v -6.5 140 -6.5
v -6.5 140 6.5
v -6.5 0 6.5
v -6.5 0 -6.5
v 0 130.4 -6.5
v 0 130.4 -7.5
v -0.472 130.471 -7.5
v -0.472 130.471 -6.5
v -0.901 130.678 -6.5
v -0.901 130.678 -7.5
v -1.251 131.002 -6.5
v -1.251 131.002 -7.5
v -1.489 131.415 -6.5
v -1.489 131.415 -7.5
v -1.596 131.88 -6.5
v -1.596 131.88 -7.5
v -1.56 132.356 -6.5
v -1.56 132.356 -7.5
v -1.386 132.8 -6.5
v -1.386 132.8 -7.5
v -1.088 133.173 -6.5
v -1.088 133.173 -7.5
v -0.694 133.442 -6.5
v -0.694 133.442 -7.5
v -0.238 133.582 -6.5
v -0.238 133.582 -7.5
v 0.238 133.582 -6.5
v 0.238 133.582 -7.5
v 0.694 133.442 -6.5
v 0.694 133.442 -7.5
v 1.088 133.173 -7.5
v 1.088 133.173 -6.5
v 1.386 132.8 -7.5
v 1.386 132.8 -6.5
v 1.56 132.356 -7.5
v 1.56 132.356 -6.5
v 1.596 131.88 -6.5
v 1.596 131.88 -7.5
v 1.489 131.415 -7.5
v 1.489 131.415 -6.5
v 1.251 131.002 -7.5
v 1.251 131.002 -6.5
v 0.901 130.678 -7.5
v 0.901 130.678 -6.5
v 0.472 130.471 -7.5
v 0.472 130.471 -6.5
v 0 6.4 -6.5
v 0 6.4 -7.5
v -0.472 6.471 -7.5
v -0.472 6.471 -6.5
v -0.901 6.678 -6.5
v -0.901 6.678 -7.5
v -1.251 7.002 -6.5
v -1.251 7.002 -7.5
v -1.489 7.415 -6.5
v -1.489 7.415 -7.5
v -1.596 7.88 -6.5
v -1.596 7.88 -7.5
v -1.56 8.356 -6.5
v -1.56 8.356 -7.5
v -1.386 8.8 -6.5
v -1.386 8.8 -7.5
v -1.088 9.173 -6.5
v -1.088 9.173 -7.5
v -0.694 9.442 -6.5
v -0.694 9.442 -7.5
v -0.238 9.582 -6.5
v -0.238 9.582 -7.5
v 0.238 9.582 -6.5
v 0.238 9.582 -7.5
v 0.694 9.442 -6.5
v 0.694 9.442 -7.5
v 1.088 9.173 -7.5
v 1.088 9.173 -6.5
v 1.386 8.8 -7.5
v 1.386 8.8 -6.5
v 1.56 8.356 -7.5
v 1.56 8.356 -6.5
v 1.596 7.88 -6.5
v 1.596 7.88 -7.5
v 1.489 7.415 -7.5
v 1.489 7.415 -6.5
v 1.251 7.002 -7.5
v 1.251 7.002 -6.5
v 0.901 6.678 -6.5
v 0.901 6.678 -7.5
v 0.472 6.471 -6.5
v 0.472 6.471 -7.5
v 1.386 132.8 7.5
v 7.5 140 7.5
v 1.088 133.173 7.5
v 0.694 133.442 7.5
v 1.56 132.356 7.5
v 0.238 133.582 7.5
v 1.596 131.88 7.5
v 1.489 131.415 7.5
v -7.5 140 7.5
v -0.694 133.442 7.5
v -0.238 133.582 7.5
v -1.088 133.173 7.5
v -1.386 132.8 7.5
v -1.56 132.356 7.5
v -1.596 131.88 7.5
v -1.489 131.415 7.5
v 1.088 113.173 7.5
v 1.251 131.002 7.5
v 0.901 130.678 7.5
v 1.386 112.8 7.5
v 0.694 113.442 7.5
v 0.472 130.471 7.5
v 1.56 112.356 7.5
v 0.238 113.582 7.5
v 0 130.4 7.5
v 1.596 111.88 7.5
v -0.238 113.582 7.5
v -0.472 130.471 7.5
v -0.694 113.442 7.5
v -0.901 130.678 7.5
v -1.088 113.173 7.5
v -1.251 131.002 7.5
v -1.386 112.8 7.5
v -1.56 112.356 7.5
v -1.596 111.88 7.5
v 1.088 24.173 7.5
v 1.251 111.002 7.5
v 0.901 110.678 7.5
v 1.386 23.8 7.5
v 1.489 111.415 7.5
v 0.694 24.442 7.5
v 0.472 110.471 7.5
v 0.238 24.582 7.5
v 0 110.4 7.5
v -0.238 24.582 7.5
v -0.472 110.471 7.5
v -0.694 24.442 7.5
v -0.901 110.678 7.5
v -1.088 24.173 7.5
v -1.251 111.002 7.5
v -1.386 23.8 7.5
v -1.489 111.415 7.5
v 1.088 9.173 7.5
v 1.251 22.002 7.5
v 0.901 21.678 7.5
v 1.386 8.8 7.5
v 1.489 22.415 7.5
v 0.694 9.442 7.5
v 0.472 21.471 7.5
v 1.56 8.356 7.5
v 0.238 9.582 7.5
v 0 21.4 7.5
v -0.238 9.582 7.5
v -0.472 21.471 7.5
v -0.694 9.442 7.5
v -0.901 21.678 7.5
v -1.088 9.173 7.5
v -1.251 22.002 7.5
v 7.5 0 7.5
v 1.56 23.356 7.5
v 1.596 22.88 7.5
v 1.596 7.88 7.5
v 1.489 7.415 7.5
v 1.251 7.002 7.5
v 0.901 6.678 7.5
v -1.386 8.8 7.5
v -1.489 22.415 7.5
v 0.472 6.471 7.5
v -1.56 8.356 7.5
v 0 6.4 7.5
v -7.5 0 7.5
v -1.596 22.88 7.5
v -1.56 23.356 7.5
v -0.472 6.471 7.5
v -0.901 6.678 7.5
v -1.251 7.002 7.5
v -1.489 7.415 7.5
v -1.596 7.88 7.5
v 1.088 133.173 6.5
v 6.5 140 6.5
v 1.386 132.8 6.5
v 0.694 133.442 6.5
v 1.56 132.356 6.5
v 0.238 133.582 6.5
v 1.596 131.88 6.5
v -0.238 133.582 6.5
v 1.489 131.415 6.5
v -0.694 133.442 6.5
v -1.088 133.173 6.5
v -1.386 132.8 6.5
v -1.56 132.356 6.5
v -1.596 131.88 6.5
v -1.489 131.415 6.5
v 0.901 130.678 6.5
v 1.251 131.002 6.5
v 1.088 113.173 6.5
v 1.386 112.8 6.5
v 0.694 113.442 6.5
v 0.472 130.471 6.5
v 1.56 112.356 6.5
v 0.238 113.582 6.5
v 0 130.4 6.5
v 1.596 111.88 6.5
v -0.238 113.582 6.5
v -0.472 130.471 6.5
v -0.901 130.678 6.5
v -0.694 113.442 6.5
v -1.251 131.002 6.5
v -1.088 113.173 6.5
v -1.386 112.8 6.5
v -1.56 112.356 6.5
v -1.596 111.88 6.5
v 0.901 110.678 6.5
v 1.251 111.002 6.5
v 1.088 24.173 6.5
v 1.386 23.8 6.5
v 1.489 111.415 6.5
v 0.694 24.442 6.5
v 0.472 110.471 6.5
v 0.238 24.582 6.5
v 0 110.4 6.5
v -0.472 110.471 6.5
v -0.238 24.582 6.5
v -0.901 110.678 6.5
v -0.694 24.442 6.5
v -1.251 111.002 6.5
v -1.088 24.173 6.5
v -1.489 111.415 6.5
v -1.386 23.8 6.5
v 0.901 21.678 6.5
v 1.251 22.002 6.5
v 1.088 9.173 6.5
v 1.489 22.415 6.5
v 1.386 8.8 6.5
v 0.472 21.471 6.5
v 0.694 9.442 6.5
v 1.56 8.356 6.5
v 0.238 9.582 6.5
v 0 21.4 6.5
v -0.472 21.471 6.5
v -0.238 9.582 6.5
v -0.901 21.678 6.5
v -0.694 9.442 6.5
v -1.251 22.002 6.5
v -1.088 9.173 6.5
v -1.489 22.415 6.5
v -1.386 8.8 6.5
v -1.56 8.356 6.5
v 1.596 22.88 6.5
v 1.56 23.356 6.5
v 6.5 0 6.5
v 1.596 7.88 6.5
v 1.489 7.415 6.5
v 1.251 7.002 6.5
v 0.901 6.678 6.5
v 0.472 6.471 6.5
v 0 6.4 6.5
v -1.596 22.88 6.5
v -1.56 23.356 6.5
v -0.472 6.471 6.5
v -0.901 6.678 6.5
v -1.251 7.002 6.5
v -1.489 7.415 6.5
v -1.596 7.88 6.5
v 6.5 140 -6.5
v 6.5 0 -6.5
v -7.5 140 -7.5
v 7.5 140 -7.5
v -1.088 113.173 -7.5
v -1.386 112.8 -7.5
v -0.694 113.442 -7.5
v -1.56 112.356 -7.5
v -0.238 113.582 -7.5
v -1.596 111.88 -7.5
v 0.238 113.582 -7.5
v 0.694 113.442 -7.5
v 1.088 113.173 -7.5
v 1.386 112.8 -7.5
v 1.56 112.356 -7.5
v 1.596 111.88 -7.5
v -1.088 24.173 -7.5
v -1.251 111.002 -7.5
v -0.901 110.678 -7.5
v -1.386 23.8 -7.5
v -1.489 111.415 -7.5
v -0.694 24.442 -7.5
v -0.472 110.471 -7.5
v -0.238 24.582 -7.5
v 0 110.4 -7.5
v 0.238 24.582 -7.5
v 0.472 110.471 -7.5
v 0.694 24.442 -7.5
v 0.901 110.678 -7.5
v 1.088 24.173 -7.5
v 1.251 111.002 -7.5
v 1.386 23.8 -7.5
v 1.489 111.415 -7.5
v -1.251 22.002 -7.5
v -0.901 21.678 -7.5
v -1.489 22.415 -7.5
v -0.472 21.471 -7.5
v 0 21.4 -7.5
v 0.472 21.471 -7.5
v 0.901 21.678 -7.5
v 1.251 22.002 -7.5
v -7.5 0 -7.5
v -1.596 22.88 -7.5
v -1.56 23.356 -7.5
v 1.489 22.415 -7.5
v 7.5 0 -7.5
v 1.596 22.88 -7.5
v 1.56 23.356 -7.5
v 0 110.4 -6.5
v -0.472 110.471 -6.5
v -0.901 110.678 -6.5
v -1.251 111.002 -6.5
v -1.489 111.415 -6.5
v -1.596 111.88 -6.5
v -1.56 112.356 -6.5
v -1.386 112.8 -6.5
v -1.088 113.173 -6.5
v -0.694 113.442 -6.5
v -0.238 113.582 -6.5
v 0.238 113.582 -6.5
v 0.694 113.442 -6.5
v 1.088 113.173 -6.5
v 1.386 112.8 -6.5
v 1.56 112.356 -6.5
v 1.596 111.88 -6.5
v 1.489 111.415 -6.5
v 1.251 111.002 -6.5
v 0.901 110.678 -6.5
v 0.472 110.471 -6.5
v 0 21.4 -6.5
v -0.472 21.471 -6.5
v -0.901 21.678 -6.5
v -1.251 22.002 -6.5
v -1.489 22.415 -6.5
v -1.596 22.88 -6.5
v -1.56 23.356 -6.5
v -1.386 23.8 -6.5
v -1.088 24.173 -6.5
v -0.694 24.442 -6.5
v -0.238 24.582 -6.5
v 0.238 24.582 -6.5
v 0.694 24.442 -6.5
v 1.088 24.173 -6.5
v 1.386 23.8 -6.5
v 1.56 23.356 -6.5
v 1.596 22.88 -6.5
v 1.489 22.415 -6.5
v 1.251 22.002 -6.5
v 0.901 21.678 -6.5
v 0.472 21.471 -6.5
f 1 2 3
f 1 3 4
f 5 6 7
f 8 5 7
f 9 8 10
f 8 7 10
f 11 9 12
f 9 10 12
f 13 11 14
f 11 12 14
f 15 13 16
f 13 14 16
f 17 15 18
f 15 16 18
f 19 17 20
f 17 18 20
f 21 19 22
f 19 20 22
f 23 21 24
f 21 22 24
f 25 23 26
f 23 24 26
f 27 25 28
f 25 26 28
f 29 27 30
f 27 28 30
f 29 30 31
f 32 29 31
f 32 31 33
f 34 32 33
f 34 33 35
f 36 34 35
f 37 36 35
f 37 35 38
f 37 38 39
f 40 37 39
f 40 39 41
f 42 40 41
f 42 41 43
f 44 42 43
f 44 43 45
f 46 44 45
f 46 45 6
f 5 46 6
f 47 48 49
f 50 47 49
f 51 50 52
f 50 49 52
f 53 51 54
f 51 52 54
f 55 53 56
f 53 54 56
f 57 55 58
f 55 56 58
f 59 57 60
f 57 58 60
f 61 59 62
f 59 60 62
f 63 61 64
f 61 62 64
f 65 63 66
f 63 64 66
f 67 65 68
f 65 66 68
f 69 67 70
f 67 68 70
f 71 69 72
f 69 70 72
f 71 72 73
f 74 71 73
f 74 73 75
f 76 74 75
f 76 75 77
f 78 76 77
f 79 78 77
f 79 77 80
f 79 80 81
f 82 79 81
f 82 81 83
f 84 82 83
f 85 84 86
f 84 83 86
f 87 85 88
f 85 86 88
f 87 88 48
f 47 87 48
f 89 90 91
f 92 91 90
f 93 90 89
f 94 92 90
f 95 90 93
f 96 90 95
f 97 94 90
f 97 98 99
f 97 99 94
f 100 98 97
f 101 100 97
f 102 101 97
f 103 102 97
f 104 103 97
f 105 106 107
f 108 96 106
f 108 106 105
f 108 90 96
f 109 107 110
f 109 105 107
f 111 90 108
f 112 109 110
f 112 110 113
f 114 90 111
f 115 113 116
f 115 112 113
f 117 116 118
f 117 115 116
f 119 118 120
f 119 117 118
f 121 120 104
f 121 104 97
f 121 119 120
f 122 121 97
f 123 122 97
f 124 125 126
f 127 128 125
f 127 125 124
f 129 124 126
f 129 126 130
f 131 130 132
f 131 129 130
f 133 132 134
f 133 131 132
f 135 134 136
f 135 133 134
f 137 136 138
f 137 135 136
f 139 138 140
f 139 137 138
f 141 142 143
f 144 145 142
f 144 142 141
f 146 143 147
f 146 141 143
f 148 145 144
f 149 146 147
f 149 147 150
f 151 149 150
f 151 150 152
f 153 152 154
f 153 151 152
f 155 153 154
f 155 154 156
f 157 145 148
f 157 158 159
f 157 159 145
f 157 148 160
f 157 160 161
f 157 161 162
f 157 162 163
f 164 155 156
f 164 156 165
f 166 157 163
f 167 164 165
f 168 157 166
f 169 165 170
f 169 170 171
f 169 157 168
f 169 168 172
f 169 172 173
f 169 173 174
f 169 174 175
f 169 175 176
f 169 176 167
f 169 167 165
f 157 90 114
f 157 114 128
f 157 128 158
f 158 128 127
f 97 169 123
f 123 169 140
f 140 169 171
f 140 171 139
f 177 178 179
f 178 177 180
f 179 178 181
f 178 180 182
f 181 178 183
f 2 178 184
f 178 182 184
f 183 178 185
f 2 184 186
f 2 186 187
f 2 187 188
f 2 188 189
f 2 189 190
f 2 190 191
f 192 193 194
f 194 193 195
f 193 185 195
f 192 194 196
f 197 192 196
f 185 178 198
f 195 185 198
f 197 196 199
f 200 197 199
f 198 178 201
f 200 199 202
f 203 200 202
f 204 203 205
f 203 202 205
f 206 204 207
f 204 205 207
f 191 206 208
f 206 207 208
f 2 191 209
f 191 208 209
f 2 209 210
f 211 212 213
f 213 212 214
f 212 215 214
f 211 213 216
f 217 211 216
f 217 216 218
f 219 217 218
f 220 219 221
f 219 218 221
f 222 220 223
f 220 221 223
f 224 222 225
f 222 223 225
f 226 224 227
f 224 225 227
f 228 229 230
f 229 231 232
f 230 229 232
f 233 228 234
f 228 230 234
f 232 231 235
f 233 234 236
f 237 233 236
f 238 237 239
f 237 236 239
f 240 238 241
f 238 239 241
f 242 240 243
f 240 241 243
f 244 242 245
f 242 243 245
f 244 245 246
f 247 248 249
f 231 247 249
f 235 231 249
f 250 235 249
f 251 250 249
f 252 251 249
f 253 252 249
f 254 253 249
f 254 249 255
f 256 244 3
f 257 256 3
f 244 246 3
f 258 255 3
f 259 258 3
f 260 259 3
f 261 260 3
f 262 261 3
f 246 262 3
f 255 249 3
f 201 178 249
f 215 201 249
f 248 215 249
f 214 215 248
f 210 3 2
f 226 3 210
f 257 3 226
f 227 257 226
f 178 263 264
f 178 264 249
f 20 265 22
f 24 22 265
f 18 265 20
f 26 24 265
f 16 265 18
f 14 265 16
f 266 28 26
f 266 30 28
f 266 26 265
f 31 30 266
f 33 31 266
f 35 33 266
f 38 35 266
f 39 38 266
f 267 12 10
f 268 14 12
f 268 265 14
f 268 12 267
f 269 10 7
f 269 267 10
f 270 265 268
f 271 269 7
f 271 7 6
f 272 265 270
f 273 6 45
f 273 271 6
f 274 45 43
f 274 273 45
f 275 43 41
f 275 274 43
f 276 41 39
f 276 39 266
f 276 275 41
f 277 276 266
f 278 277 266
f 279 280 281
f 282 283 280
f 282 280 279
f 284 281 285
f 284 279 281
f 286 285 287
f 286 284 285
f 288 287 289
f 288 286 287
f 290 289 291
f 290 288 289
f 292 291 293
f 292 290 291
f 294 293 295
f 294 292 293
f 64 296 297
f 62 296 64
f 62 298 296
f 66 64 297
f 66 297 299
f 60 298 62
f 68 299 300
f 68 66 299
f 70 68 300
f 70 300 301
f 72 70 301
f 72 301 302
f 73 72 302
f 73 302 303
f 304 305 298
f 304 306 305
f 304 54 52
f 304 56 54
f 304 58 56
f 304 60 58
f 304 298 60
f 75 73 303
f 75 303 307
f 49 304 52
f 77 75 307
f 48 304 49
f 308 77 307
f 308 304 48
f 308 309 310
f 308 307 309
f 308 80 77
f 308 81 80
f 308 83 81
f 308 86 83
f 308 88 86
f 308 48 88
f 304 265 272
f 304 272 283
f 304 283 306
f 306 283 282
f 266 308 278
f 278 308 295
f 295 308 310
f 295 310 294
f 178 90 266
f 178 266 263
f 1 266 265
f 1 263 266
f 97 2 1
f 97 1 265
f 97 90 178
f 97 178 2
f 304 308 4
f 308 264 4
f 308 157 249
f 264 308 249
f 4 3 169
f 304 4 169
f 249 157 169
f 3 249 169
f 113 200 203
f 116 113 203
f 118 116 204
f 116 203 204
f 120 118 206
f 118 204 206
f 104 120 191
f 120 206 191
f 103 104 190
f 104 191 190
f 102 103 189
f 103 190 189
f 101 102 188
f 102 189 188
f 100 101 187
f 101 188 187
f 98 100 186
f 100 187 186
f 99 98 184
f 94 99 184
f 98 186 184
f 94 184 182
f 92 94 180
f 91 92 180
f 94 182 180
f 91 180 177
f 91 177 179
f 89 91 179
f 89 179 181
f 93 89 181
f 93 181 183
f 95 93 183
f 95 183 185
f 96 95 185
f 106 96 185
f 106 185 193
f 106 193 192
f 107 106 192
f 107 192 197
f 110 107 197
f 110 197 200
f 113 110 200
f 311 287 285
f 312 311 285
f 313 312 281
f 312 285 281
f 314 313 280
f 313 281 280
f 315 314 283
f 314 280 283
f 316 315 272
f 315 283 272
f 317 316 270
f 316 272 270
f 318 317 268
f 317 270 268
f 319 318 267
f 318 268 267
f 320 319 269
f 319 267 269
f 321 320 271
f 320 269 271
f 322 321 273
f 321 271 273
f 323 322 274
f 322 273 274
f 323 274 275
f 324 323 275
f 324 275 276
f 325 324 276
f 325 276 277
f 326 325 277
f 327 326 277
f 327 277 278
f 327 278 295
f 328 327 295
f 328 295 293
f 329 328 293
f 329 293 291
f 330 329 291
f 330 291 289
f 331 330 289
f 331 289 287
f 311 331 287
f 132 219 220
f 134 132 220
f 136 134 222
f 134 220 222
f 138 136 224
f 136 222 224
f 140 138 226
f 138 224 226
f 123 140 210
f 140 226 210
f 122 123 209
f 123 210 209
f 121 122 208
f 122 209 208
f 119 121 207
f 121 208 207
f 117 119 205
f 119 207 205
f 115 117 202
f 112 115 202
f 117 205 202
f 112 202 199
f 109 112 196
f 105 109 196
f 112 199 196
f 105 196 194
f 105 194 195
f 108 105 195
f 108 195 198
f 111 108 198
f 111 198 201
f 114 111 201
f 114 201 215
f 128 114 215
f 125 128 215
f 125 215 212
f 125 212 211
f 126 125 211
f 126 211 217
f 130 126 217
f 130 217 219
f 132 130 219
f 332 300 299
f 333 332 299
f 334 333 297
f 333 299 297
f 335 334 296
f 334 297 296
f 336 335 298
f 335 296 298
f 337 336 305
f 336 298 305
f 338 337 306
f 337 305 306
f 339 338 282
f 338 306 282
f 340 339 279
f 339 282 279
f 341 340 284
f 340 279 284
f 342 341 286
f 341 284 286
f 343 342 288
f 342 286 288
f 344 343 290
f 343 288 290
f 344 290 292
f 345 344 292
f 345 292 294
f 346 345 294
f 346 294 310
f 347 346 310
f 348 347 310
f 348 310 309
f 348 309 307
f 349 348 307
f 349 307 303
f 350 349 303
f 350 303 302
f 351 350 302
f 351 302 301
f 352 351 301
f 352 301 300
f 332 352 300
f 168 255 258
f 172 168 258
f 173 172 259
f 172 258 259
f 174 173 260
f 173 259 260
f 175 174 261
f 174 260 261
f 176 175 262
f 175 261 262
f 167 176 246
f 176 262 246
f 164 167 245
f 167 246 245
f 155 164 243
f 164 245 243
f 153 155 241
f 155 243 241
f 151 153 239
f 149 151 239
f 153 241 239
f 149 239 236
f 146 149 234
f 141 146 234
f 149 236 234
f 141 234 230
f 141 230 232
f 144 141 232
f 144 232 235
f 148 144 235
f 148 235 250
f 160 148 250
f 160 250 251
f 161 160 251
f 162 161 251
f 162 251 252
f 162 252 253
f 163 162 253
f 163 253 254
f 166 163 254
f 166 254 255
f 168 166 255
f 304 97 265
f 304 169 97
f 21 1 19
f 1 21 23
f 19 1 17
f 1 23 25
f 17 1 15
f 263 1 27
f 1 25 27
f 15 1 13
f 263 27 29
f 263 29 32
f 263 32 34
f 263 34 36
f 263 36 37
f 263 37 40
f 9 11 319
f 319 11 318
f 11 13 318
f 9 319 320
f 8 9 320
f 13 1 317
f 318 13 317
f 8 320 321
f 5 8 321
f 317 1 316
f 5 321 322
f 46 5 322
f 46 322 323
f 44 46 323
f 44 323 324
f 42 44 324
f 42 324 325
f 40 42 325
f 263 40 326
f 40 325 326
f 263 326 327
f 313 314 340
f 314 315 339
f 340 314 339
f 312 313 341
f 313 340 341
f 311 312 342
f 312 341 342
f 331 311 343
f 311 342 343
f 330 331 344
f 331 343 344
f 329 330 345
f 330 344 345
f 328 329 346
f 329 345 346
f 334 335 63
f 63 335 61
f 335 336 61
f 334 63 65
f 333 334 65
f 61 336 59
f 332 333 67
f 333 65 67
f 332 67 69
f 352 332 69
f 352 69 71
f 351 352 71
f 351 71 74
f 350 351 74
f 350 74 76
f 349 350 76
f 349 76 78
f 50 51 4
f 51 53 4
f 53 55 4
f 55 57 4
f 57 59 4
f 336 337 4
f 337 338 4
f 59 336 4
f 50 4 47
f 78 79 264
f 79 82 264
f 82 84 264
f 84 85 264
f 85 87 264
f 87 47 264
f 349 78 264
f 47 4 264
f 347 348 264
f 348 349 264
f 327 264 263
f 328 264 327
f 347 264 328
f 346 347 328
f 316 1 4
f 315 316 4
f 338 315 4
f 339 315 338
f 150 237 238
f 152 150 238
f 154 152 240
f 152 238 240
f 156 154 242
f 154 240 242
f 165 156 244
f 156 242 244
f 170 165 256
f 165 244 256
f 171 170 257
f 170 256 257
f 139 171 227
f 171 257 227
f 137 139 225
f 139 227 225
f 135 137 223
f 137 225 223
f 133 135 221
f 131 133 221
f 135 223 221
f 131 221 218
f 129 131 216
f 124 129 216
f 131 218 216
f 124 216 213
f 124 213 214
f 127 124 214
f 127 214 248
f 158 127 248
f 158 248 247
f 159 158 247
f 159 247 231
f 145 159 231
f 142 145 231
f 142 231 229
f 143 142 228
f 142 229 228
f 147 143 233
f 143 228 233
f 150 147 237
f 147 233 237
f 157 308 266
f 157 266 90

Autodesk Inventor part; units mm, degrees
ref_plane "YZ Plane" through (0, 0, 0) normal (1, 0, 0) x (0, 1, 0)
ref_plane "XZ Plane" through (0, 0, 0) normal (0, 1, 0) x (-1, 0, 0)
ref_plane "XY Plane" through (0, 0, 0) normal (0, 0, 1) x (1, 0, 0)
sketch "スケッチ1" plane through (0, 0, 0) normal (0, 1, 0) x (-1, 0, 0)
  line L0 (7.5, -7.5) -> (-7.5, -7.5)
  line L1 (-7.5, -7.5) -> (-7.5, 7.5)
  line L2 (-7.5, 7.5) -> (7.5, 7.5)
  line L3 (7.5, 7.5) -> (7.5, -7.5)
  line L4 (7.5, -7.5) -> (-7.5, 7.5) construction
  line L5 (-7.5, -7.5) -> (7.5, 7.5) construction
  point P0 (0, 0)
  dimension "d0" = 15
  dimension "d1" = 15
extrude "押し出し1" add sketch "スケッチ1" along normal blind 140
shell "シェル1" thickness 1 removed faces 2 at (-2.5, 0, -2.5) at (-2.5, 140, -2.5)
sketch "スケッチ2" plane through (-7.5, 0, 7.5) normal (0, 0, 1) x (1, 0, 0)
  line L0 (15, 0) -> (0, 0) projected
  line L1 (0, 140) -> (15, 140) projected
  point P0 (7.5, 0)
  point P1 (7.5, 8)
  point P2 (7.5, 23)
  point P3 (7.5, 0)
  point P4 (7.5, 132)
  point P5 (7.5, 112)
  point P6 (7.5, 140)
  dimension "d5" = 8
  dimension "d6" = 15
  dimension "d14" = 8
  dimension "d15" = 20
hole "穴1" at (0, 8, 7.5) at (0, 23, 7.5) at (0, 132, 7.5) at (0, 112, 7.5) direction (0, 0, -1) diameter 3.2 end through all
properties part number "PitchSquarePipe2" material "アルミニウム 5005-H12"
